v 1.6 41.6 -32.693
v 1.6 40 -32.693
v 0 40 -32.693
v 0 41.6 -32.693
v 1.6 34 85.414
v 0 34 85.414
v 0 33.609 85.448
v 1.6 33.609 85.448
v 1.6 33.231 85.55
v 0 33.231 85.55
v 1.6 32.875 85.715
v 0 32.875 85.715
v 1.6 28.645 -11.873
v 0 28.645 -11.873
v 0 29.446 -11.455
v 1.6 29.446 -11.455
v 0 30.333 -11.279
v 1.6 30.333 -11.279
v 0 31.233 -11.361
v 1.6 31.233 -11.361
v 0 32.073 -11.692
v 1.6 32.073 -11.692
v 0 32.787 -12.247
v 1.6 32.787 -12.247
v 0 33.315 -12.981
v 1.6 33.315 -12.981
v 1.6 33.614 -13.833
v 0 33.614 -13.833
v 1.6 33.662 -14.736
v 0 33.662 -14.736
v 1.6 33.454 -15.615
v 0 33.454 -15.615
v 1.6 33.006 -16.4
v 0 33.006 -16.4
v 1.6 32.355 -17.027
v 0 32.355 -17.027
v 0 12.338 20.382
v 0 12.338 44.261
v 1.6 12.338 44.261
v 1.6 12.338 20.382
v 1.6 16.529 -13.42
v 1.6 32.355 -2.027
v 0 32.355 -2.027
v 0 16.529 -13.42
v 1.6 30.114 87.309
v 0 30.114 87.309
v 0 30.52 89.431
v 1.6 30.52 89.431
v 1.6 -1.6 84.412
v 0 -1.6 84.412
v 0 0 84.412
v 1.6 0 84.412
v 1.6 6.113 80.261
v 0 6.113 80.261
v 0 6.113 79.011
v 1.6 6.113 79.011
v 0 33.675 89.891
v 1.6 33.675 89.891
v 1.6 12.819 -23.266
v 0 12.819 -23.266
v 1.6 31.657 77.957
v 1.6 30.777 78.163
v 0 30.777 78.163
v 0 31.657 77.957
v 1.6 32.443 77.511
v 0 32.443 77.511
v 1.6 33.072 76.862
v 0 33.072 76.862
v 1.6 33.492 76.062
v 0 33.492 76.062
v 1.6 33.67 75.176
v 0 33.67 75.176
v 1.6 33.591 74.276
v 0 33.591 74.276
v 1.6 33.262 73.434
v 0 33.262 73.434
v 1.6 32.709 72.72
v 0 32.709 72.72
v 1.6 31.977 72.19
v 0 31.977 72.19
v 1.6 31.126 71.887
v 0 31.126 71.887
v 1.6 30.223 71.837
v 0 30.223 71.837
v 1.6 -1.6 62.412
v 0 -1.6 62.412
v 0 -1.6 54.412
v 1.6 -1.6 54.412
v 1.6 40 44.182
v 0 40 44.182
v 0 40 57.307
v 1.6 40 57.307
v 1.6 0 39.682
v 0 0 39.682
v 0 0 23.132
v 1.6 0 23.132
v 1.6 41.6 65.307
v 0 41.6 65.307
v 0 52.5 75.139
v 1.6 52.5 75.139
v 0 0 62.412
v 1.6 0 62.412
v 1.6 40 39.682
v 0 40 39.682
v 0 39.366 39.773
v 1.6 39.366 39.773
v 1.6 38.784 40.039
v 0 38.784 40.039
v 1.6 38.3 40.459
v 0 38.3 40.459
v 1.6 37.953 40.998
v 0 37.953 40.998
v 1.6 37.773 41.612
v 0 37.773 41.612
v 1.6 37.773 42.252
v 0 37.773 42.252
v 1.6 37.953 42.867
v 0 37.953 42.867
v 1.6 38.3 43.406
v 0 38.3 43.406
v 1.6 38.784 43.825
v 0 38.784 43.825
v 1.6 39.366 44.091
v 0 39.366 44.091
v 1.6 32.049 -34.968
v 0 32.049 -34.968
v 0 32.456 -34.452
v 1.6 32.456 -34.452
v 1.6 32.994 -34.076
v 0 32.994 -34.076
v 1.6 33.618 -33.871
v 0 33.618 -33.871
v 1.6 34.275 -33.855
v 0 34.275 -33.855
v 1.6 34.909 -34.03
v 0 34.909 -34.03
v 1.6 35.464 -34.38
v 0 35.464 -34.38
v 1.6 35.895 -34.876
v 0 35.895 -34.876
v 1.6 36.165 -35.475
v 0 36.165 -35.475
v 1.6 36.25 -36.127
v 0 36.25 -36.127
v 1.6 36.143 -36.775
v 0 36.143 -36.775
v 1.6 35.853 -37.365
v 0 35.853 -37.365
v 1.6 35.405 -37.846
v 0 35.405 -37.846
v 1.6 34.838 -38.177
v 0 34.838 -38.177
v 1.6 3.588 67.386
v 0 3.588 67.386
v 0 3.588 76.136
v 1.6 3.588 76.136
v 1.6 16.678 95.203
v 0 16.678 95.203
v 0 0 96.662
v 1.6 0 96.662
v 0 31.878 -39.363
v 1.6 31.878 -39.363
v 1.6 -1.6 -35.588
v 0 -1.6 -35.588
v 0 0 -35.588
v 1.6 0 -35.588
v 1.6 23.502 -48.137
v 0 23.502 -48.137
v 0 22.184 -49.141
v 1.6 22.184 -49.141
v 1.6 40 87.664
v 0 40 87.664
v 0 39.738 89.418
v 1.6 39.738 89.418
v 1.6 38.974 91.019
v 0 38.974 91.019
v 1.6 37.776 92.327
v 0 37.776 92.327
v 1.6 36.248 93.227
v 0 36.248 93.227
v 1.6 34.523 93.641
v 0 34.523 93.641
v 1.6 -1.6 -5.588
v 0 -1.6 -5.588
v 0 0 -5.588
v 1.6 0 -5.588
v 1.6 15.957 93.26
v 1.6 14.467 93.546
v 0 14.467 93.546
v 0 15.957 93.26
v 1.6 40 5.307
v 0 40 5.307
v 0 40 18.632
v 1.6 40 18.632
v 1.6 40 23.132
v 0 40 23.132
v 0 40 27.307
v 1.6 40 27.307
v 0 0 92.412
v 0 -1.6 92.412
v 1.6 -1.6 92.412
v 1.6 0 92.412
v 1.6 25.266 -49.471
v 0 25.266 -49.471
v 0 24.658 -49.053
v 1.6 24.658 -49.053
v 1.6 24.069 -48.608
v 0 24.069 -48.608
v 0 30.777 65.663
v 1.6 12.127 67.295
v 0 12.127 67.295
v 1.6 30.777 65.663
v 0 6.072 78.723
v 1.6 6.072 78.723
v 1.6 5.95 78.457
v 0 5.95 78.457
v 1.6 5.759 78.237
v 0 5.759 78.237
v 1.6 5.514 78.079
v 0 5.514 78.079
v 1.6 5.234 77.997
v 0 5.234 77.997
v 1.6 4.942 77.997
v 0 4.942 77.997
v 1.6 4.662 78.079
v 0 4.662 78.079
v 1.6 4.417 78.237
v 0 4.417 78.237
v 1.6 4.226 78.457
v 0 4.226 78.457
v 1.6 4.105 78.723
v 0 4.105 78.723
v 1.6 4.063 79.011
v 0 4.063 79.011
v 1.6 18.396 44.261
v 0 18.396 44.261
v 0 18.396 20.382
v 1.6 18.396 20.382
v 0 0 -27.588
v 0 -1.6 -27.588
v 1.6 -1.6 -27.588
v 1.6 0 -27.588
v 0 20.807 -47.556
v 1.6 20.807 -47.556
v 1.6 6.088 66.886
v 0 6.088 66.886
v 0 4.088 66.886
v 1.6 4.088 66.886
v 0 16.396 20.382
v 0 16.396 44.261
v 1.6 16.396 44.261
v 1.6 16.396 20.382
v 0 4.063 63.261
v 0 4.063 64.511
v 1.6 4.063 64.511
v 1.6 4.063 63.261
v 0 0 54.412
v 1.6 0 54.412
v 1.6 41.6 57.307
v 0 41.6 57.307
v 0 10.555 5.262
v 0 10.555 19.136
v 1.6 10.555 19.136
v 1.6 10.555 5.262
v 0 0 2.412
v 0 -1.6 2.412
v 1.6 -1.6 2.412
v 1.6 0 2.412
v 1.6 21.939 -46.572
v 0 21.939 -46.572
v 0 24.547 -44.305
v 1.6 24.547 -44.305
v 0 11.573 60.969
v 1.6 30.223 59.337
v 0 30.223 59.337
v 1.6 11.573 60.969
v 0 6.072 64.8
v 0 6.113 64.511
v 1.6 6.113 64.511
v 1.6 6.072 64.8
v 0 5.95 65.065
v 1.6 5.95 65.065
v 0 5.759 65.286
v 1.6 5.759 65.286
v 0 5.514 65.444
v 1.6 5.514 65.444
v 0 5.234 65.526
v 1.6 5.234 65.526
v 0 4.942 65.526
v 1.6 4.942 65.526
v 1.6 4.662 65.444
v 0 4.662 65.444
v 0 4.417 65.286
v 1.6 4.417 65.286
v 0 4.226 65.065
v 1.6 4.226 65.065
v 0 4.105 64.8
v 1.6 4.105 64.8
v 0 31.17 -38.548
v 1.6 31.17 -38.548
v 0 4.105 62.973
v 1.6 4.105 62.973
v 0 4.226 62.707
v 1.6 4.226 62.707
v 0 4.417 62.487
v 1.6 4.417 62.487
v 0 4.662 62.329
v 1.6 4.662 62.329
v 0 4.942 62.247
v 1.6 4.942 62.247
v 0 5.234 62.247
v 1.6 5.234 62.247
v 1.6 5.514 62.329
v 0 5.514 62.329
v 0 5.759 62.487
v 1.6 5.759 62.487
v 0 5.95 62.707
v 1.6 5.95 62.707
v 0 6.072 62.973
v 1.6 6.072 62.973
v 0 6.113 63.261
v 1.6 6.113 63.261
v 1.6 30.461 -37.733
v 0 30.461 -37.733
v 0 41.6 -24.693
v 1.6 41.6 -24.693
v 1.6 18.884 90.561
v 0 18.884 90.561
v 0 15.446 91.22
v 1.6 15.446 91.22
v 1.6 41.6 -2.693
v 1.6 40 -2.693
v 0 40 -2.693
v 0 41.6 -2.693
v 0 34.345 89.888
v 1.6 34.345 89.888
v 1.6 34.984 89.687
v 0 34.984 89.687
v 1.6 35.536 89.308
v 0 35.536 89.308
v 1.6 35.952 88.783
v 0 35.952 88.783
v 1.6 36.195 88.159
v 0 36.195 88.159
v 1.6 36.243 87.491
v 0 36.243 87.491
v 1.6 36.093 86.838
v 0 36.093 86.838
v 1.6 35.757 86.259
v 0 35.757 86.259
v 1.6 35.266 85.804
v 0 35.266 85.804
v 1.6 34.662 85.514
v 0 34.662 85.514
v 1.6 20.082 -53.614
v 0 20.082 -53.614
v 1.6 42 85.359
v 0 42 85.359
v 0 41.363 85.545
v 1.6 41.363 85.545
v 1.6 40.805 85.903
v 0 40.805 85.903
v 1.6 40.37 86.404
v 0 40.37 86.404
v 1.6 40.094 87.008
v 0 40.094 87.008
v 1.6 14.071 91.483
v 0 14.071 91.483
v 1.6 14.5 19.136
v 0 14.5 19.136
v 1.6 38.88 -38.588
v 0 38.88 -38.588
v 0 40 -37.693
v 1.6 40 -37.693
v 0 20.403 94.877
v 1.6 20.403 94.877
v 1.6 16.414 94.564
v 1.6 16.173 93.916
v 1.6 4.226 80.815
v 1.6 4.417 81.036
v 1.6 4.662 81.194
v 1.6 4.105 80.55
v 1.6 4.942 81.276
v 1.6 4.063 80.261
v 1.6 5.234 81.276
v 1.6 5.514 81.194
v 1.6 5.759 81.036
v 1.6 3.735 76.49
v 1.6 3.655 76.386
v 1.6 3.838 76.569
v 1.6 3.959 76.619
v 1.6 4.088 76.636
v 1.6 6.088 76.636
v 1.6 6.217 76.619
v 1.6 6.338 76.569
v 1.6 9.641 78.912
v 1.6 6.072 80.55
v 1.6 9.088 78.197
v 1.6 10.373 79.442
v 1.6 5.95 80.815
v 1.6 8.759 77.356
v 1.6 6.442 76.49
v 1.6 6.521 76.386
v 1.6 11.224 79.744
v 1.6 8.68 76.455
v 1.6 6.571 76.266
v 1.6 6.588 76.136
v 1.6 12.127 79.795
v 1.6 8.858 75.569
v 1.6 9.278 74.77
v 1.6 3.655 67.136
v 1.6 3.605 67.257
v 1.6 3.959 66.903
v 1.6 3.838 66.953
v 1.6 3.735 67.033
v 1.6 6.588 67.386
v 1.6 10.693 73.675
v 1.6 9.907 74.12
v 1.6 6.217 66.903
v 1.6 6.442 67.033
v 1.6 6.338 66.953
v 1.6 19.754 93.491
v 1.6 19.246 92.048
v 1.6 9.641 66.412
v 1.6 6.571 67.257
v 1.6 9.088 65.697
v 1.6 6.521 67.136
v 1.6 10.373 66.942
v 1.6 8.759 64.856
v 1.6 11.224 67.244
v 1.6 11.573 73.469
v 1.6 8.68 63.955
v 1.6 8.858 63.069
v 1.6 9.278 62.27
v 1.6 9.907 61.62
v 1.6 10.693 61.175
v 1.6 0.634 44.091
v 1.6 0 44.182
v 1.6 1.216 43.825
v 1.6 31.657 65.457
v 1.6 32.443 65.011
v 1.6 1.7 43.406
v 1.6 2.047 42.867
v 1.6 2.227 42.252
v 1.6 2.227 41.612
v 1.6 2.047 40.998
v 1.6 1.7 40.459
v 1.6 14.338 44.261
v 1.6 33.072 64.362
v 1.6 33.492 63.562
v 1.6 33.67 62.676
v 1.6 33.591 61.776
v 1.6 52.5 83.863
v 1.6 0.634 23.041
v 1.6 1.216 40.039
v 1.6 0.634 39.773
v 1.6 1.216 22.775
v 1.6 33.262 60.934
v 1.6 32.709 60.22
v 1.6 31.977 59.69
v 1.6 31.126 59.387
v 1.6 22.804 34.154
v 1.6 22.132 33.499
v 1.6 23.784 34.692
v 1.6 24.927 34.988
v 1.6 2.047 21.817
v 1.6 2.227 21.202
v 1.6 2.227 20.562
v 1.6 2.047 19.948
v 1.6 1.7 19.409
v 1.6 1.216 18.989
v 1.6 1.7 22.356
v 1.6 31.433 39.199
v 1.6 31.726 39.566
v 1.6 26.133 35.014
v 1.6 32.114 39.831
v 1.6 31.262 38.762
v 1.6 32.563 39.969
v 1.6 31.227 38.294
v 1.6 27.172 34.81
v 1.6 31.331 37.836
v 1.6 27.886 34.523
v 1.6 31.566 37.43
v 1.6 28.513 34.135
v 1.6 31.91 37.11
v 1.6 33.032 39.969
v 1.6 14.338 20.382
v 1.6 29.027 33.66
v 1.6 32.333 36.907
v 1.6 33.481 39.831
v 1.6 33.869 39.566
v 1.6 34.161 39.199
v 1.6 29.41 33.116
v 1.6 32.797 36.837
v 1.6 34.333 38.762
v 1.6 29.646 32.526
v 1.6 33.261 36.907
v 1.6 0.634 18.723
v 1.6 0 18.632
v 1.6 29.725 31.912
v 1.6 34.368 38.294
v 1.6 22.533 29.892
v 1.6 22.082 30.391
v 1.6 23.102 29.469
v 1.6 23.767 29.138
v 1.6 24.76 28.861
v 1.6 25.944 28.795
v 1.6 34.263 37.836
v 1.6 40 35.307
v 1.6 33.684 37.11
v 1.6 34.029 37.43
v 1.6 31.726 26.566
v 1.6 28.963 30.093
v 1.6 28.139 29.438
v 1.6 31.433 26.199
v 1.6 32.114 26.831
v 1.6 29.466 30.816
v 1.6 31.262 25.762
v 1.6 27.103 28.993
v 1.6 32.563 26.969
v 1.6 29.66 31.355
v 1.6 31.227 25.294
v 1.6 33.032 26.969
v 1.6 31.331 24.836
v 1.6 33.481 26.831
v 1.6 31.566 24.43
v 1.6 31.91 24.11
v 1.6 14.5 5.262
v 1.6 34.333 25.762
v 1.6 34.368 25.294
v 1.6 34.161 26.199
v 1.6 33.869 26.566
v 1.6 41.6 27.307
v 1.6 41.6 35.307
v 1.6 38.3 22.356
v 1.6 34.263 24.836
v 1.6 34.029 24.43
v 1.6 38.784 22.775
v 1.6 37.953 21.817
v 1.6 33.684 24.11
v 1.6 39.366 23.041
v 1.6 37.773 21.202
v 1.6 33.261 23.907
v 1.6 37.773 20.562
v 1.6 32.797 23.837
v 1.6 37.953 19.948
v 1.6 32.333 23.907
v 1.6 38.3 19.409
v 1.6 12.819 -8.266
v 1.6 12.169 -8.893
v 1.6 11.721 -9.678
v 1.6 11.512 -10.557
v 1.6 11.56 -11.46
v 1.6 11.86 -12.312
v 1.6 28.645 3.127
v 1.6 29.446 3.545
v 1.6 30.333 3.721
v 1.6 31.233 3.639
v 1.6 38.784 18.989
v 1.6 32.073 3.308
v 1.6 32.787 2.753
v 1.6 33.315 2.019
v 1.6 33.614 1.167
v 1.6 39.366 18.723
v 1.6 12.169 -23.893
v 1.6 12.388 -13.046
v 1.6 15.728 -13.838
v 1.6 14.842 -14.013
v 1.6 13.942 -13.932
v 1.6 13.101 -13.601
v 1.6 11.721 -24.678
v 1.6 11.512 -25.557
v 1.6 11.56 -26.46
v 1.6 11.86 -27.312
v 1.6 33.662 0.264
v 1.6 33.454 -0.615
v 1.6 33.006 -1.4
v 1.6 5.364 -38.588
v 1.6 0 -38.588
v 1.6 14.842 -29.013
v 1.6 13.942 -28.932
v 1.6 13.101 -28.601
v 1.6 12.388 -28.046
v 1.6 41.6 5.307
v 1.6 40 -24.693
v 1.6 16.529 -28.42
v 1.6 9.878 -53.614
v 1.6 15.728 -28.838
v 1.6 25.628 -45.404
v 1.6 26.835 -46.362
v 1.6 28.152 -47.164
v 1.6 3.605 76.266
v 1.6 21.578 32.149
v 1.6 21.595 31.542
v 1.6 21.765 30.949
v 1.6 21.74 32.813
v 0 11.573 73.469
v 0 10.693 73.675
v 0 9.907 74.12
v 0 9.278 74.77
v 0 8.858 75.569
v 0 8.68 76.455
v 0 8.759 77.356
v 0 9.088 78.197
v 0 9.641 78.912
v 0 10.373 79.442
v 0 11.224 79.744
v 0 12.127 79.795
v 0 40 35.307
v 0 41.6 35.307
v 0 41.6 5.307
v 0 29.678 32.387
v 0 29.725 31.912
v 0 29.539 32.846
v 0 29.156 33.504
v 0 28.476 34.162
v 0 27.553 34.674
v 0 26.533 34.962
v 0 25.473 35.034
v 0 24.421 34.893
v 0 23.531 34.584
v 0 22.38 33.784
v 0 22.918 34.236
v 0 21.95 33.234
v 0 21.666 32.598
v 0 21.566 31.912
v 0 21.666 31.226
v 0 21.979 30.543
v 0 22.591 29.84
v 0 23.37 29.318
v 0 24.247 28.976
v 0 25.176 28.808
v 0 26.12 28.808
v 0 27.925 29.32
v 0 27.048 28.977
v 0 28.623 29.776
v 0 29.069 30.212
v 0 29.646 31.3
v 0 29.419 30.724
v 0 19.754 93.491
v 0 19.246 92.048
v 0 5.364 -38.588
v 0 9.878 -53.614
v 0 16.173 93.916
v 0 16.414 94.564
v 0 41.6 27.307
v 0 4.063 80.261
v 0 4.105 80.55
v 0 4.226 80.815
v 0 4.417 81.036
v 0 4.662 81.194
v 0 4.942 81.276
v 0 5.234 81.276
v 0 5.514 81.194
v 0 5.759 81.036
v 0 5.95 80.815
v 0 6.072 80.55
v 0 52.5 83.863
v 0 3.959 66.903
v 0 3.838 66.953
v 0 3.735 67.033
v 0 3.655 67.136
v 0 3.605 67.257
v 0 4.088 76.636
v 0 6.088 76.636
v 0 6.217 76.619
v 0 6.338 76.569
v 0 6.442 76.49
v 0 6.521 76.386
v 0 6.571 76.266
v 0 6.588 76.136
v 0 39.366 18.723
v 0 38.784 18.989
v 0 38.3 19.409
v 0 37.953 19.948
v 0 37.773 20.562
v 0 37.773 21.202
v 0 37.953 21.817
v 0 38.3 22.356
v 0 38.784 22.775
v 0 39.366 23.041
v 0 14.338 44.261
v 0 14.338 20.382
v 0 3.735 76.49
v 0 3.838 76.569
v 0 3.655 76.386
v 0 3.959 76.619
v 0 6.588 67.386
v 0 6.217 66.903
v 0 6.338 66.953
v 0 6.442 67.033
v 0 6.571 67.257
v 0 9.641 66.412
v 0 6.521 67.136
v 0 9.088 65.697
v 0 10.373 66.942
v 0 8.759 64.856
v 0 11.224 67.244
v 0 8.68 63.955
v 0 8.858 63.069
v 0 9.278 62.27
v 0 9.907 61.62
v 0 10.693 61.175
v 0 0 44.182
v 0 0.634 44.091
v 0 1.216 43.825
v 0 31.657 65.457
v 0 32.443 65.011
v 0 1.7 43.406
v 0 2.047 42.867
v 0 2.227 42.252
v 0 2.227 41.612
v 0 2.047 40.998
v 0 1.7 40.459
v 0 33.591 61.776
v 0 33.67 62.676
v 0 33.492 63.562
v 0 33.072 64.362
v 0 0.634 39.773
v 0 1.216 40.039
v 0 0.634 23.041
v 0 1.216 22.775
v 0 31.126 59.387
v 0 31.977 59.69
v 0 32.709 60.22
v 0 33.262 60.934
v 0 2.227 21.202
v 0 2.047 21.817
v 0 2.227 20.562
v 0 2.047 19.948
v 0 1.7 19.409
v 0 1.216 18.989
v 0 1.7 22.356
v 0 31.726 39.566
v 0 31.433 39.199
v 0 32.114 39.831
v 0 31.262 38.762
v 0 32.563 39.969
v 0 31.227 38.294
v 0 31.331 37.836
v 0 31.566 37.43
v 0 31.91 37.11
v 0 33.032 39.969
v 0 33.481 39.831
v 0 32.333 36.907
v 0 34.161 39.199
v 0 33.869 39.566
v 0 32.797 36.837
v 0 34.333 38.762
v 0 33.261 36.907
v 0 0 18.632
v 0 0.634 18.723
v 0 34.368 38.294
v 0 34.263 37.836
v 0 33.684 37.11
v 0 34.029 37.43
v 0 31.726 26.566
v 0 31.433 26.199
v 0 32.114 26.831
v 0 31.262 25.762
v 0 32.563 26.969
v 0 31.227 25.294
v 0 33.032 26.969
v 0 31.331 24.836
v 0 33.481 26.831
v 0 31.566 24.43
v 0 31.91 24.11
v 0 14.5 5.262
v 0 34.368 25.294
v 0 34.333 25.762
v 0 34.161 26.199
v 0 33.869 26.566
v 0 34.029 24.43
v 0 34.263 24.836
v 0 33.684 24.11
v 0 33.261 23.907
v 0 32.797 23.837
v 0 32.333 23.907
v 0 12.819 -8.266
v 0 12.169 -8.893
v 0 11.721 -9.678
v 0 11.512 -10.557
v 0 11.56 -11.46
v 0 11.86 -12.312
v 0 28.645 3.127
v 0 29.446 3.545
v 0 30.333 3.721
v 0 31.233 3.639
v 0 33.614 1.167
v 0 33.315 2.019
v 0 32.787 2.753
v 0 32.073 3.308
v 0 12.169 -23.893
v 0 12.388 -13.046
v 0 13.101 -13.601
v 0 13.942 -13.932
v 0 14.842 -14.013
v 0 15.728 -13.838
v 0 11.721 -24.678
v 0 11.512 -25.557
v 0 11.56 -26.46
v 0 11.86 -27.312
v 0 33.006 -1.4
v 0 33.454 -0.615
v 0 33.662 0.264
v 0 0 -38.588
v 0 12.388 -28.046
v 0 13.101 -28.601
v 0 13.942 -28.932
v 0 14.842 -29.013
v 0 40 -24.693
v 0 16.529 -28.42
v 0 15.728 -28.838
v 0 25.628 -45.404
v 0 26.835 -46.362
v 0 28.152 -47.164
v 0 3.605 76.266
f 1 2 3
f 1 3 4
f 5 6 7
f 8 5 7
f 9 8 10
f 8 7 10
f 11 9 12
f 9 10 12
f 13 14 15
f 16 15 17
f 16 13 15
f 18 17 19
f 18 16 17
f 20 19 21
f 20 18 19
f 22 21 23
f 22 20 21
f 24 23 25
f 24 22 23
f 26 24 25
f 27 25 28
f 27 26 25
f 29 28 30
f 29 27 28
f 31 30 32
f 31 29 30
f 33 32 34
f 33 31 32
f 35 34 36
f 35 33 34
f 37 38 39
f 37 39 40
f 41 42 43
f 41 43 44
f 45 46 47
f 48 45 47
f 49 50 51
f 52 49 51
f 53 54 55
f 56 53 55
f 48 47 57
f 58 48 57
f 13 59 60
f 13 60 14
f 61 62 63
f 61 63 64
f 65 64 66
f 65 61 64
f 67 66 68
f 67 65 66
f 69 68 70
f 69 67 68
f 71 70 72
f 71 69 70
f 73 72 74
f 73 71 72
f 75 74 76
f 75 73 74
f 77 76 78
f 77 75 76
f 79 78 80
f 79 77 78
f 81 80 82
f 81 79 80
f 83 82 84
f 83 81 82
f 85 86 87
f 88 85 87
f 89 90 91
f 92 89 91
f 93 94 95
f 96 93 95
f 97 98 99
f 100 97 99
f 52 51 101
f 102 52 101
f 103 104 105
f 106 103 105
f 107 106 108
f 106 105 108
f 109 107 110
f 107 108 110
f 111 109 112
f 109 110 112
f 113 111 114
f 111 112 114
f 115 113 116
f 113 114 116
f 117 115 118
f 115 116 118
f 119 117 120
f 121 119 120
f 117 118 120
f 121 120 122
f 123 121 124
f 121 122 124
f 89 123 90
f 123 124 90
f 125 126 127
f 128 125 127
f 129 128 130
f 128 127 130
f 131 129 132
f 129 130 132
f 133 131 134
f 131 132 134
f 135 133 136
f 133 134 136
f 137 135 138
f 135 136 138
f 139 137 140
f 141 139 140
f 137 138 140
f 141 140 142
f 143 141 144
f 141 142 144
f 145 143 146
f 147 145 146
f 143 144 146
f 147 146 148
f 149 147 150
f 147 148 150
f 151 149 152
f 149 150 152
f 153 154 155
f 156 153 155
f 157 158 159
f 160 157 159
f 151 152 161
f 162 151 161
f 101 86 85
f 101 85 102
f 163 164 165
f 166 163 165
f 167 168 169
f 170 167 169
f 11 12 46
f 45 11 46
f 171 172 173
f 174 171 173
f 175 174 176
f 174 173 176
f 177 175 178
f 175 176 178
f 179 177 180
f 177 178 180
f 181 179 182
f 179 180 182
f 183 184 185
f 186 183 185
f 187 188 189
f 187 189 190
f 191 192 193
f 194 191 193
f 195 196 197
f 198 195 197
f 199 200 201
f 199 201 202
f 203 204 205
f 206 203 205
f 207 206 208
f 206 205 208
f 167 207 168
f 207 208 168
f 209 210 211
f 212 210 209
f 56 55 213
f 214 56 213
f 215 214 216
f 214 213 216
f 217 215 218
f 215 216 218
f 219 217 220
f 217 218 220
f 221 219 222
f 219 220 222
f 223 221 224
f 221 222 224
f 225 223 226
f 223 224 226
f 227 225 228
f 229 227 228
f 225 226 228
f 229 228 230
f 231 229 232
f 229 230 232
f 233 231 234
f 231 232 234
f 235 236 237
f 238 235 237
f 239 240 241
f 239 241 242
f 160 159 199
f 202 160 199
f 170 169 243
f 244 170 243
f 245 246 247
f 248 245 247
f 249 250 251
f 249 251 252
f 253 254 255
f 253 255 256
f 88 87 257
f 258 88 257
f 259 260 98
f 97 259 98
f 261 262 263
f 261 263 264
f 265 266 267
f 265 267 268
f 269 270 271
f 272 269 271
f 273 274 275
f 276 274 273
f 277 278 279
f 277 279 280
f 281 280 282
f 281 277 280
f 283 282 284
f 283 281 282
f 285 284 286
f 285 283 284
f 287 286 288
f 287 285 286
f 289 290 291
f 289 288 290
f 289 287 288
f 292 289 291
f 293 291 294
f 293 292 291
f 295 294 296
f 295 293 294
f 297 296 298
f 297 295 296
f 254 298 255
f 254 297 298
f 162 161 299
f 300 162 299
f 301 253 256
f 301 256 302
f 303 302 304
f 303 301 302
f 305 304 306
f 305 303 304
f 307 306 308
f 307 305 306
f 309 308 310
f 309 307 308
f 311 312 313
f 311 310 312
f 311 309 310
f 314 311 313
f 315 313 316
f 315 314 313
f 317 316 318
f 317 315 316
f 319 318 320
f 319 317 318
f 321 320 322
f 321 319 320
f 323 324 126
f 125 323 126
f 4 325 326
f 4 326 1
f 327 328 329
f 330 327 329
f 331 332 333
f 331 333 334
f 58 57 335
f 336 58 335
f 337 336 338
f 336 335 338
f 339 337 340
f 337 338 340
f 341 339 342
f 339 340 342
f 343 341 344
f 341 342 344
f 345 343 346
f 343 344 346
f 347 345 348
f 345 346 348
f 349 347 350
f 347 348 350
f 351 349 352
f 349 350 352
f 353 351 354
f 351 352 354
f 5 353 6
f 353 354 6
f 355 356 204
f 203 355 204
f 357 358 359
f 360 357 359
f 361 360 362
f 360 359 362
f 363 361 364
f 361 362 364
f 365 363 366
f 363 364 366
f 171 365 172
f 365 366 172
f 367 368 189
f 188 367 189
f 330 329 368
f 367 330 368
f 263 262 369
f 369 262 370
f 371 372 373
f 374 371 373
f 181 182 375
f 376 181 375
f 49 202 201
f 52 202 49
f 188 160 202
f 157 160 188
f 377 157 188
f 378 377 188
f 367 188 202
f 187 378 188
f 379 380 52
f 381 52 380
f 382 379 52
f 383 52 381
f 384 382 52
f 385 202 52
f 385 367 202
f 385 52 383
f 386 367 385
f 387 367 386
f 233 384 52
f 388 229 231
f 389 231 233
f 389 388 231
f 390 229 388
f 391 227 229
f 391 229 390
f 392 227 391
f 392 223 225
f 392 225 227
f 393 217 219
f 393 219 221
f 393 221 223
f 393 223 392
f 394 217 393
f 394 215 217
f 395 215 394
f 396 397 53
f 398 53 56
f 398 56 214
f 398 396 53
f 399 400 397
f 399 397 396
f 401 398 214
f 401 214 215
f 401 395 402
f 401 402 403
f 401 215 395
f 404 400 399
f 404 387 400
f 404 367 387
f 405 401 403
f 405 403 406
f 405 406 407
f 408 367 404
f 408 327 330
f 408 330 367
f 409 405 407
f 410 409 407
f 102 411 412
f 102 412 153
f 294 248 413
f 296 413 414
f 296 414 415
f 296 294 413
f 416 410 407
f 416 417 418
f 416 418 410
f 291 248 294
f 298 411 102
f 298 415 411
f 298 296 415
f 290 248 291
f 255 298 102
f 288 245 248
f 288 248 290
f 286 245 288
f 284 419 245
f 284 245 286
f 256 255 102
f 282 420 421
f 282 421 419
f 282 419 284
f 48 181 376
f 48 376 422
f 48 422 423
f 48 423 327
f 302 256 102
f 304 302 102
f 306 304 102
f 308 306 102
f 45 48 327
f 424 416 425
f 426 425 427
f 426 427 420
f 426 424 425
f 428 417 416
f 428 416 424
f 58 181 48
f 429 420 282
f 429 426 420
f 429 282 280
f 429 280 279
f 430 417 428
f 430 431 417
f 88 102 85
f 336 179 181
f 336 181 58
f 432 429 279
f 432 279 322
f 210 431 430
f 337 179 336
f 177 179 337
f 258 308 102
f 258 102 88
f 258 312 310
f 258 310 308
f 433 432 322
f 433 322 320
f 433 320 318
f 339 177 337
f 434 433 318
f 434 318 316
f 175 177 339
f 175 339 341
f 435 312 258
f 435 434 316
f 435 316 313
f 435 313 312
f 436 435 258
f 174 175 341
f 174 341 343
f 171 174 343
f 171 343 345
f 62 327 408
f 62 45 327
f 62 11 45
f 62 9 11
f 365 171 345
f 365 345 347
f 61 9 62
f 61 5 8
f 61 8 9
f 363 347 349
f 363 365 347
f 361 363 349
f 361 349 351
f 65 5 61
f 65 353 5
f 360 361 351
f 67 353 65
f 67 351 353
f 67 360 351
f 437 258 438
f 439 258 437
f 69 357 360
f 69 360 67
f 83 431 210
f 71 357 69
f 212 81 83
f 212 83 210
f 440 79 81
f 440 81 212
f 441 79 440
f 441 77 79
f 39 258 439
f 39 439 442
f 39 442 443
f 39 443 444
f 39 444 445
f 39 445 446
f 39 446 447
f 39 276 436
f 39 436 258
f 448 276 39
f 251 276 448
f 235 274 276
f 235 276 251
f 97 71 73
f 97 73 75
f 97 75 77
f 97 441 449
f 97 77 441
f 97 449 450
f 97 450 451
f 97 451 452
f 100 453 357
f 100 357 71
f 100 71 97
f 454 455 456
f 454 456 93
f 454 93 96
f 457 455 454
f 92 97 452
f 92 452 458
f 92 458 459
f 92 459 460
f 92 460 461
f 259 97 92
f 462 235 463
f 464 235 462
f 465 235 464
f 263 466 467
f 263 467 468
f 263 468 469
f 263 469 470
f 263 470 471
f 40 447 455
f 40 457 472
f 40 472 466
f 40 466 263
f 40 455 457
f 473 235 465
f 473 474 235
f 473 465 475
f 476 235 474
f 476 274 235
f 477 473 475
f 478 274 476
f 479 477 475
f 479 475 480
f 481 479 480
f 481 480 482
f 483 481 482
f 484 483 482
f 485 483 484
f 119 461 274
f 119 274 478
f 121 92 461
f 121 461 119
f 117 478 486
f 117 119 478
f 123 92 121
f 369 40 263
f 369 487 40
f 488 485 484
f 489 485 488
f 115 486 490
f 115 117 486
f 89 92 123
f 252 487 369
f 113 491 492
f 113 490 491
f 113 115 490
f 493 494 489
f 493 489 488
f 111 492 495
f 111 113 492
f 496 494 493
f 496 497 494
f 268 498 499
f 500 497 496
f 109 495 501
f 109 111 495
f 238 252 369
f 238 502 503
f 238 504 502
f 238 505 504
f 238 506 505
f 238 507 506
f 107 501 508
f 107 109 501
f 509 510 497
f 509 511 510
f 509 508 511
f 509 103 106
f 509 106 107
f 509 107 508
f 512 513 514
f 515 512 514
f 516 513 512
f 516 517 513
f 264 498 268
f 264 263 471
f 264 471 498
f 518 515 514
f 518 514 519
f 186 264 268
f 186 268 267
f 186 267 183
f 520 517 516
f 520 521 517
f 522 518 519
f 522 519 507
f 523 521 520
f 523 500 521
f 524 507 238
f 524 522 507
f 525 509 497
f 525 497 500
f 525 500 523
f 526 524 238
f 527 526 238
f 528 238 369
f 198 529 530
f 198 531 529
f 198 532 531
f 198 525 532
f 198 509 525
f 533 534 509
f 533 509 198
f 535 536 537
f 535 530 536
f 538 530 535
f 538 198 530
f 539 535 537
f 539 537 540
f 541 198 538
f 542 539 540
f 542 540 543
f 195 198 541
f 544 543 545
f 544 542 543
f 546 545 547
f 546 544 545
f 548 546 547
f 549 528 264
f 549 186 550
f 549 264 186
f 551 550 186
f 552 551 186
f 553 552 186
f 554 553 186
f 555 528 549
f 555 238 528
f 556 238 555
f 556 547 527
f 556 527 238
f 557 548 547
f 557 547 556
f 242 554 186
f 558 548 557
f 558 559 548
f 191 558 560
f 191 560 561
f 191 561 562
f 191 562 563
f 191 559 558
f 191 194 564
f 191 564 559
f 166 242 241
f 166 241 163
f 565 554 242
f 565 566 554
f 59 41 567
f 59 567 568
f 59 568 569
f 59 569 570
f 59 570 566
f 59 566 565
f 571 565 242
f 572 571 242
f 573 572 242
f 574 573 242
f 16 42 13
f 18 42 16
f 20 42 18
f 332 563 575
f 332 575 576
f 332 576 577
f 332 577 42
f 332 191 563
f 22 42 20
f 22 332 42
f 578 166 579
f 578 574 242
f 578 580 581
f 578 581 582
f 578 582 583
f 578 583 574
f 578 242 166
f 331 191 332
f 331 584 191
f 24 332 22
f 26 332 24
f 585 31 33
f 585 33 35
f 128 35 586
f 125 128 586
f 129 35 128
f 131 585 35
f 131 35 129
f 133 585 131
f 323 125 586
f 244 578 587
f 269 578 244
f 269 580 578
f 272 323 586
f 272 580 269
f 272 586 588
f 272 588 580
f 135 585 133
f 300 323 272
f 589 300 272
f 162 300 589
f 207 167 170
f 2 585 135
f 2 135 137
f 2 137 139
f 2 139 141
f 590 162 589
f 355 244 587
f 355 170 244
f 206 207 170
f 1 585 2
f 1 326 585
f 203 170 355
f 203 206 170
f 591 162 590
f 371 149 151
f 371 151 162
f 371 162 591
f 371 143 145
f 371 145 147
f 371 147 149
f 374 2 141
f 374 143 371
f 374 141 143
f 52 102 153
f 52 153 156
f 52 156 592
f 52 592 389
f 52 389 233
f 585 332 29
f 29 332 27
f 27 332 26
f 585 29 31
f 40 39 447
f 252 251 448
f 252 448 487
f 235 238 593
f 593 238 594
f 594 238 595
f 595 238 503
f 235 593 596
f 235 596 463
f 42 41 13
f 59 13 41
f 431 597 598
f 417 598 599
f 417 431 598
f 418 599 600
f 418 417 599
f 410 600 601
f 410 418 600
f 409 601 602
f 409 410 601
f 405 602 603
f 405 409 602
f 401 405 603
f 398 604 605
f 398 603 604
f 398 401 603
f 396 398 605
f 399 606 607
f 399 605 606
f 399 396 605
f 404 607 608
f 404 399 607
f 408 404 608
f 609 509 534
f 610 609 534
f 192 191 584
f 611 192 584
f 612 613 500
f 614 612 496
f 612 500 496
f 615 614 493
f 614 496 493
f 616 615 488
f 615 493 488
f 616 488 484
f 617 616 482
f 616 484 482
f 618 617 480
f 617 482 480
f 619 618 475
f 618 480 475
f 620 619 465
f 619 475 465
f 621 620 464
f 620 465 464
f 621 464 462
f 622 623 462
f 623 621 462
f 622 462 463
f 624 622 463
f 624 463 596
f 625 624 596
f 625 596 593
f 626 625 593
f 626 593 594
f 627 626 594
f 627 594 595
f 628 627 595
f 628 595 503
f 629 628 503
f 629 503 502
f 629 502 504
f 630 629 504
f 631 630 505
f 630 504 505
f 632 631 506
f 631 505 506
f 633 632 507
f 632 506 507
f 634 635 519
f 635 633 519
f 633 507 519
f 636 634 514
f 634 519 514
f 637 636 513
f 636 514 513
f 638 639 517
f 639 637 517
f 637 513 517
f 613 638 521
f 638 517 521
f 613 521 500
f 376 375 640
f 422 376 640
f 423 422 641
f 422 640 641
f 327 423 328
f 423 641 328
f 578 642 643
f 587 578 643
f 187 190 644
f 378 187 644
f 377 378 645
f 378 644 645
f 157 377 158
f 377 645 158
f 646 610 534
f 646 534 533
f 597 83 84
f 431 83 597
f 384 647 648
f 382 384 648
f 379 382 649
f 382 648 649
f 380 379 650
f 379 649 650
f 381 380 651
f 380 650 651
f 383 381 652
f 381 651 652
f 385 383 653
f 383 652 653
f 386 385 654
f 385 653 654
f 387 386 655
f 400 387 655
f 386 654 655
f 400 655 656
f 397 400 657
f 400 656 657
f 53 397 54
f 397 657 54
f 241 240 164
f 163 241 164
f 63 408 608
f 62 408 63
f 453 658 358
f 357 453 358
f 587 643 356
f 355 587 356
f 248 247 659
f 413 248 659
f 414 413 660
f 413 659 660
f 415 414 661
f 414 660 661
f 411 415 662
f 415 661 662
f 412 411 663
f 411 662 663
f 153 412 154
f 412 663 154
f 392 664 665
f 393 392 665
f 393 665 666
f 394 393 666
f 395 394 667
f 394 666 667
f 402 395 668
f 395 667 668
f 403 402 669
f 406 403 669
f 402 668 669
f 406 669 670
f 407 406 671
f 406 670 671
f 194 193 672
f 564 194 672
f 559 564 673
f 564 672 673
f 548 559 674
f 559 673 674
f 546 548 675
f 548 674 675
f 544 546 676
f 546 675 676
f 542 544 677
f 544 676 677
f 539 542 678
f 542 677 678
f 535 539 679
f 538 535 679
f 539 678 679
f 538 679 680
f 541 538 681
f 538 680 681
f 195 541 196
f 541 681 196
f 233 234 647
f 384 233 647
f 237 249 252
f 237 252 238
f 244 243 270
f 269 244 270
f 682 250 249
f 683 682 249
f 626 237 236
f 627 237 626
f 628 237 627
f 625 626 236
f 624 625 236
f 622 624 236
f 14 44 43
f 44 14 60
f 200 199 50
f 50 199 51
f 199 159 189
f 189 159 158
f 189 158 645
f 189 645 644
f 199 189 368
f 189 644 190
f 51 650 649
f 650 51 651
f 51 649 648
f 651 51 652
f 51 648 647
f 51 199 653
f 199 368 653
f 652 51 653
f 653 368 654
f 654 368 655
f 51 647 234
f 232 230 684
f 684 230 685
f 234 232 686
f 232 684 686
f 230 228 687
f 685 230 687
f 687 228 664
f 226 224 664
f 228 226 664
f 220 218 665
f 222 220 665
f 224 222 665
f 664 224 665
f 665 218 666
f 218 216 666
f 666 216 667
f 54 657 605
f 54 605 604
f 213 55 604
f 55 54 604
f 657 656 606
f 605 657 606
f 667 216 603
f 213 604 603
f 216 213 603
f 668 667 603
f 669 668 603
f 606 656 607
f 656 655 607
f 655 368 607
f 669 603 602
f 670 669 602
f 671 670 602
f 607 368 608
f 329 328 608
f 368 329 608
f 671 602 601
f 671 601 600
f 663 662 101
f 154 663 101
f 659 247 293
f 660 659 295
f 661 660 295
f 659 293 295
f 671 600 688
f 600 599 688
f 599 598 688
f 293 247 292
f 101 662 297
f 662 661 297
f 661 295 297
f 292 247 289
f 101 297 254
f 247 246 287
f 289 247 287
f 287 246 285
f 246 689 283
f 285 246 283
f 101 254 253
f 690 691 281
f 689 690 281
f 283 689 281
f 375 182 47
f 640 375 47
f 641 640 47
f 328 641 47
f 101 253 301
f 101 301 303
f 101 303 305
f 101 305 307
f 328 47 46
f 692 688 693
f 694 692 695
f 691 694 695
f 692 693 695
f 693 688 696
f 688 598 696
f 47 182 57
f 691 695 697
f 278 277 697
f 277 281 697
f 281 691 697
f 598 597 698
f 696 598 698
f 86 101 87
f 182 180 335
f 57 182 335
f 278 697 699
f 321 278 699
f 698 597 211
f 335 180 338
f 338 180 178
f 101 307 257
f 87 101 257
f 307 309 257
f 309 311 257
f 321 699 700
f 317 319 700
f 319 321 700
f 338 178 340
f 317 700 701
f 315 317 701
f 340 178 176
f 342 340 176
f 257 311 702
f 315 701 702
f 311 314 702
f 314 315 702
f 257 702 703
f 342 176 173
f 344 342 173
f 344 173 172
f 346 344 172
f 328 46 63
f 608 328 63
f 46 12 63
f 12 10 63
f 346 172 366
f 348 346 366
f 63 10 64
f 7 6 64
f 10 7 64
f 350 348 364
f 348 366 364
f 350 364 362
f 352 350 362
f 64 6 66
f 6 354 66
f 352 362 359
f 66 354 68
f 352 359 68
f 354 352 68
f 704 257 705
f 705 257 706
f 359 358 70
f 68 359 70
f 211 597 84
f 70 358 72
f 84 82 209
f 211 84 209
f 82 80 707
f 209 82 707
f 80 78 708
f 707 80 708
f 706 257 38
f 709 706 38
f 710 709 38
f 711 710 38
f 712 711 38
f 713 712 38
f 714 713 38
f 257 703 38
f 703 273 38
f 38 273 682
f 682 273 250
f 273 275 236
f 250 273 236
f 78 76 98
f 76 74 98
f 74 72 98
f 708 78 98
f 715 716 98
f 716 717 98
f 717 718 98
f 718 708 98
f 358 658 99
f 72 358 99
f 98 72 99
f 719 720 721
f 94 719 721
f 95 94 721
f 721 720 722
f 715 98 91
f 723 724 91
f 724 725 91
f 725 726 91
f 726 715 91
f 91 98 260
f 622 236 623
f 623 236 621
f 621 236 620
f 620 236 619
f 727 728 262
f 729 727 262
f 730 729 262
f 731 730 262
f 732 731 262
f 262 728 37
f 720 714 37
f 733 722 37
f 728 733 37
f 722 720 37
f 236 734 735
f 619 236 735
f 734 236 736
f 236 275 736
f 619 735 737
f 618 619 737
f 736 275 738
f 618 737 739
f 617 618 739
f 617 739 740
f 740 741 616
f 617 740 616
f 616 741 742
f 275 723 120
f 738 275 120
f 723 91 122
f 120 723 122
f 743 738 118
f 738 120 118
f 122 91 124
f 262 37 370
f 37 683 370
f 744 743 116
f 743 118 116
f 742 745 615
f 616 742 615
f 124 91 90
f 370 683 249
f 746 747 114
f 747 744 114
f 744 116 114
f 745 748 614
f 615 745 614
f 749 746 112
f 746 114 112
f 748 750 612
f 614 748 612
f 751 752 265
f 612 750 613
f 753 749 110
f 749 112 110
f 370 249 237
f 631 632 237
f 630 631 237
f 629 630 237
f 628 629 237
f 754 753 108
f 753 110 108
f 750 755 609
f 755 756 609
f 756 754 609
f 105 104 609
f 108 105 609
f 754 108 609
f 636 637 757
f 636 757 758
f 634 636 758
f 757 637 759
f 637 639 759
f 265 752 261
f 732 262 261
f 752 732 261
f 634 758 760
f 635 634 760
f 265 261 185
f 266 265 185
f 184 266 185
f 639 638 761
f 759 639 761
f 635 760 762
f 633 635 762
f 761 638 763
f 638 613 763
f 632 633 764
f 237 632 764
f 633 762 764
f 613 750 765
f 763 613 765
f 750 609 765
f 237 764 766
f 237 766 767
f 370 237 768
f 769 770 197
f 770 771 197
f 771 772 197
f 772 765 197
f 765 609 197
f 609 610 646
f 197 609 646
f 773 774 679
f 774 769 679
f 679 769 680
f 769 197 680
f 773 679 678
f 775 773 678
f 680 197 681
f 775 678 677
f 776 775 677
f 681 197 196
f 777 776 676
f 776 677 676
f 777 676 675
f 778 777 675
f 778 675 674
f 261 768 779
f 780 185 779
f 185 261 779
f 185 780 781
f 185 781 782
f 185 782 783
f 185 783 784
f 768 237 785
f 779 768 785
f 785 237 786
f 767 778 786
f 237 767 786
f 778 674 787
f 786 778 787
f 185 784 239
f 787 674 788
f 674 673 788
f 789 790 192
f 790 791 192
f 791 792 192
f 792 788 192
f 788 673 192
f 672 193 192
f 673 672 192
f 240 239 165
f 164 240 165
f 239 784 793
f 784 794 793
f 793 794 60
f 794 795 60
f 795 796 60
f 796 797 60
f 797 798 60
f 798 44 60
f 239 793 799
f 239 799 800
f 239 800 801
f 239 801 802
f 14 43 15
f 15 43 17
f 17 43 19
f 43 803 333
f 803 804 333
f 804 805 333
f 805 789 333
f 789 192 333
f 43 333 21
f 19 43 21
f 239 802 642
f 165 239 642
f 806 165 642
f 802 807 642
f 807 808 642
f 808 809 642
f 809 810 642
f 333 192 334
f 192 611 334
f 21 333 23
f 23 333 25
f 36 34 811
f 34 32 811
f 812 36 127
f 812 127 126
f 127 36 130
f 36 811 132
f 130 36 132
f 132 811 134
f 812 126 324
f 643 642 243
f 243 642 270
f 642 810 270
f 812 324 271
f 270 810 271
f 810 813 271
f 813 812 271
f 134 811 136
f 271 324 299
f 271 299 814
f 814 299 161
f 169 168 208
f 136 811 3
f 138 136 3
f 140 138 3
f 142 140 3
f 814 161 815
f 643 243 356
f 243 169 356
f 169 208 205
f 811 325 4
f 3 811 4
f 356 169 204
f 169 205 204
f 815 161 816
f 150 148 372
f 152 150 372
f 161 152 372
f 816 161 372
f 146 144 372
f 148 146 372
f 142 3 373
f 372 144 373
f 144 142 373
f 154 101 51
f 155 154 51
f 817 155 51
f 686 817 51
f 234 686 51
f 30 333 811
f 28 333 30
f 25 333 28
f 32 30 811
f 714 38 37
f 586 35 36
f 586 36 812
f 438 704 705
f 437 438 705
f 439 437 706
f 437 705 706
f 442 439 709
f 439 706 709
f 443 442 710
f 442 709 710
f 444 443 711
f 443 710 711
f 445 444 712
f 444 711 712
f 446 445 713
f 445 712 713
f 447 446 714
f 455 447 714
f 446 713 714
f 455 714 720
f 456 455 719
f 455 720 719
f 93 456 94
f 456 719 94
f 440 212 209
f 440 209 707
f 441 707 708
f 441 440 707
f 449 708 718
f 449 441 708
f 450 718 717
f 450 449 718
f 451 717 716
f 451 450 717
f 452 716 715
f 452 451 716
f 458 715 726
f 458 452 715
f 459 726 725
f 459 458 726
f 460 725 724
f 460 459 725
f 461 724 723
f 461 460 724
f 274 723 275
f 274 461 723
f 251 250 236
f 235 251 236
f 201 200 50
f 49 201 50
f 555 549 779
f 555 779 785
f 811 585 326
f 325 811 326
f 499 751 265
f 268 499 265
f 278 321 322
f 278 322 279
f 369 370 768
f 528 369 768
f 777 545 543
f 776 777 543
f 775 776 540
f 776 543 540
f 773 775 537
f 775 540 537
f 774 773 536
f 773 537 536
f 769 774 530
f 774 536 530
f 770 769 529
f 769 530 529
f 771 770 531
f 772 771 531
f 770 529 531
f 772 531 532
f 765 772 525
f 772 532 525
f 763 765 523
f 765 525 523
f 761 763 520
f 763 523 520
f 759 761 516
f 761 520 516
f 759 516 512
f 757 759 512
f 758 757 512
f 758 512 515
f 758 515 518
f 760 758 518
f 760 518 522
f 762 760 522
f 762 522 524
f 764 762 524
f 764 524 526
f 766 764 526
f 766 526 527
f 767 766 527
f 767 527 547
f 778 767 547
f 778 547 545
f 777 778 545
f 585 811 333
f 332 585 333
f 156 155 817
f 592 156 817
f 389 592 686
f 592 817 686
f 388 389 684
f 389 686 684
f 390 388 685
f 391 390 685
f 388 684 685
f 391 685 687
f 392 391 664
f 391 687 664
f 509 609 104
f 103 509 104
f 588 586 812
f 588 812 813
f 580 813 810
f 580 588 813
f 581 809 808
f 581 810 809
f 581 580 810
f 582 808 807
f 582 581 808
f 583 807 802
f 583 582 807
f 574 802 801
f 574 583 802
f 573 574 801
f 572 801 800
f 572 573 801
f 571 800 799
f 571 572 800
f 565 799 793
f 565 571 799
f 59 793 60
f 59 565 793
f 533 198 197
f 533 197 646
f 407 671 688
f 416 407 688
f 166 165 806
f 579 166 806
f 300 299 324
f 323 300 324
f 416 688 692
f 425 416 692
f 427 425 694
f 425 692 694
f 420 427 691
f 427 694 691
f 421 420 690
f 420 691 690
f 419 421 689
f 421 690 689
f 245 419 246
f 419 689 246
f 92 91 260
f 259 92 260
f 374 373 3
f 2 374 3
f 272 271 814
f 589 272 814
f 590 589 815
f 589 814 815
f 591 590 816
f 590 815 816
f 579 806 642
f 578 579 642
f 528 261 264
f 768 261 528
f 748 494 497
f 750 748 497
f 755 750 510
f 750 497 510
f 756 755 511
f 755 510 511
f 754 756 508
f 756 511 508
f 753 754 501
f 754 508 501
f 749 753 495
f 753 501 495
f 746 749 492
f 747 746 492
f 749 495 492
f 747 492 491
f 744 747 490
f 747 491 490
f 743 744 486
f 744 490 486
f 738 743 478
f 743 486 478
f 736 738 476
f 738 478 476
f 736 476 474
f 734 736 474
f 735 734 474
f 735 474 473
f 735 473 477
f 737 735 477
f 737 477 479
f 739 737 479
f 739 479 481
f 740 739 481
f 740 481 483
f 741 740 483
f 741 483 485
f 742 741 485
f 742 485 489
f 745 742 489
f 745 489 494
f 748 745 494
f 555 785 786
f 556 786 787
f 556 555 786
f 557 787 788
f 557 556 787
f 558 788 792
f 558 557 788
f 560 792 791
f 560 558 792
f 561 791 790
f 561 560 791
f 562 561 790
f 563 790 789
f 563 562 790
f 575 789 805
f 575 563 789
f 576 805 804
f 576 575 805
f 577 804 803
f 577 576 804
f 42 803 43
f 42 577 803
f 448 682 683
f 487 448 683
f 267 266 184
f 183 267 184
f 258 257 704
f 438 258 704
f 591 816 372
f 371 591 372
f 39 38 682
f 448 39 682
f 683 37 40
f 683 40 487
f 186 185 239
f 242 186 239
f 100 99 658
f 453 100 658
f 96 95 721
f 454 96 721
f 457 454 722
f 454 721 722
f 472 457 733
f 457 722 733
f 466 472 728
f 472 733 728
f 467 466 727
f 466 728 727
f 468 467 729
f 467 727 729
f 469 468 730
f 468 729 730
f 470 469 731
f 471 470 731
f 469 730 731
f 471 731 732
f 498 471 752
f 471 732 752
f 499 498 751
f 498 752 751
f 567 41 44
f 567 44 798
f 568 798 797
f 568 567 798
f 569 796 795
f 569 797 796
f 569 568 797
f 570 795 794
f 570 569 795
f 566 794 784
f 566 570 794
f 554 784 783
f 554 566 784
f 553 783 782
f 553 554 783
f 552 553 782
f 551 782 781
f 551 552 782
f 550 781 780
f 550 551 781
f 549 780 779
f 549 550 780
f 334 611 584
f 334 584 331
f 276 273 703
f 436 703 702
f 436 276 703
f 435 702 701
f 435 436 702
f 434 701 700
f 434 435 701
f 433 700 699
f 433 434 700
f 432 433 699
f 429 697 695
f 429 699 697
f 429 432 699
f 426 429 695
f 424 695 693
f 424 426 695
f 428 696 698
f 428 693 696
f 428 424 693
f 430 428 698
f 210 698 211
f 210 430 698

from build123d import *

# Parameters (mm, degrees)
SKETCH_215_W           = 23.879073069
SKETCH_215_H           = 2
SKETCH_215_W_2         = 13.873866224
SKETCH_215_H_2         = 3.944574251
EXTRUDE_1_DEPTH        = 1.6
SKETCH_2_W             = 8
SKETCH_2_H             = 1.6
EXTRUDE_3744_DEPTH     = 1.6
SKETCH_3858_R          = 1.575
SKETCH_3858_RX         = 4.079397779
SKETCH_3858_RY         = 3.125
CUT_EXTRUDE_4259_DEPTH = 111.010448945
CUT_EXTRUDE_4725_DEPTH = 111.010449082
USB_C_DEPTH            = 111.010449082


with BuildPart() as part:
    # Sketch 215 → 凸台-拉伸1 (new body)
    with BuildSketch(Plane(origin=(0, 0, 0), x_dir=(0, 0, -1), z_dir=(1, 0, 0))):
        with BuildLine():
            Line((-95.202576637, 16.678130112), (-96.66172395, 0))
            Line((-96.66172395, 0), (-44.182229478, 0))
            ThreePointArc((-44.182229478, 0), (-41.932229478, 2.25), (-39.682229478, 0))
            Line((-39.682229478, 0), (-23.132229478, 0))
            ThreePointArc((-23.132229478, 0), (-20.882229478, 2.25), (-18.632229478, 0))
            Line((-18.632229478, 0), (38.58827605, 0))
            Line((38.58827605, 0), (38.58827605, 5.363667343))
            Line((38.58827605, 5.363667343), (53.613979238, 9.877821069))
            Line((53.613979238, 9.877821069), (53.613979238, 20.082386187))
            Line((53.613979238, 20.082386187), (49.47062371, 25.265958003))
            ThreePointArc((49.47062371, 25.265958003), (48.834122057, 24.360802519), (48.136507156, 23.501864655))
            Line((48.136507156, 23.501864655), (49.140587437, 22.184380908))
            Line((49.140587437, 22.184380908), (47.555615421, 20.806751165))
            Line((47.555615421, 20.806751165), (46.571594176, 21.938874033))
            Line((46.571594176, 21.938874033), (44.304779315, 24.546859335))
            ThreePointArc((44.304779315, 24.546859335), (45.901319607, 26.216879129), (47.163951689, 28.151735001))
            Line((47.163951689, 28.151735001), (38.58827605, 38.88038965))
            Line((38.58827605, 38.88038965), (37.693344157, 40))
            Line((37.693344157, 40), (-18.632229478, 40))
            ThreePointArc((-18.632229478, 40), (-20.882229478, 37.75), (-23.132229478, 40))
            Line((-23.132229478, 40), (-39.682229478, 40))
            ThreePointArc((-39.682229478, 40), (-41.932229478, 37.75), (-44.182229478, 40))
            Line((-44.182229478, 40), (-87.664190365, 40))
            ThreePointArc((-87.664190365, 40), (-91.717731611, 38.423664021), (-93.641358554, 34.522934456))
            Line((-93.641358554, 34.522934456), (-94.87665585, 20.403421746))
            ThreePointArc((-94.87665585, 20.403421746), (-92.775563539, 19.482408503), (-90.560913042, 18.883929203))
            Line((-90.560913042, 18.883929203), (-91.219638908, 15.446476624))
            Line((-91.219638908, 15.446476624), (-91.483129255, 14.071495593))
            Line((-91.483129255, 14.071495593), (-93.545600802, 14.466731113))
            Line((-93.545600802, 14.466731113), (-93.260074318, 15.956704104))
            ThreePointArc((-93.260074318, 15.956704104), (-94.241224457, 16.290763242), (-95.202576637, 16.678130112))
        make_face()
        with Locations((-32.321766012, 13.338077)):
            Rectangle(SKETCH_215_W, SKETCH_215_H, mode=Mode.SUBTRACT)
        with Locations((-32.321766012, 17.395875517)):
            Rectangle(SKETCH_215_W, SKETCH_215_H, mode=Mode.SUBTRACT)
        with Locations((-12.198657062, 12.527713279)):
            Rectangle(SKETCH_215_W_2, SKETCH_215_H_2, mode=Mode.SUBTRACT)
        with BuildLine():
            Line((-87.309268426, 30.113751112), (-88.369968079, 30.317015094))
            Line((-88.369968079, 30.317015094), (-89.430667732, 30.520279076))
            Line((-89.430667732, 30.520279076), (-89.890653352, 33.675403991))
            ThreePointArc((-89.890653352, 33.675403991), (-87.826914488, 36.244108032), (-85.414190365, 34))
            ThreePointArc((-85.414190365, 34), (-85.490811978, 33.417826153), (-85.715458265, 32.875303062))
            Line((-85.715458265, 32.875303062), (-87.309268426, 30.113751112))
        make_face(mode=Mode.SUBTRACT)
        with BuildLine():
            ThreePointArc((34.968023431, 32.04870964), (34.612244182, 35.698184303), (38.176585209, 34.837534989))
            Line((38.176585209, 34.837534989), (39.363457628, 31.878188125))
            Line((39.363457628, 31.878188125), (38.548329162, 31.169692829))
            Line((38.548329162, 31.169692829), (37.733200697, 30.461197532))
            Line((37.733200697, 30.461197532), (34.968023431, 32.04870964))
        make_face(mode=Mode.SUBTRACT)
    extrude(amount=EXTRUDE_1_DEPTH)

    # 草图2 → Extrude 3744 (add)
    with BuildSketch(Plane(origin=(0, 0, 0), x_dir=(0, 0, -1), z_dir=(1, 0, 0))):
        with Locations((31.58827605, -0.8)):
            Rectangle(SKETCH_2_W, SKETCH_2_H)
        with BuildLine():
            Line((-83.862737476, 52.5), (-85.358986401, 42))
            ThreePointArc((-85.358986401, 42), (-86.138250874, 40.569690448), (-87.664190365, 40))
            Line((-87.664190365, 40), (-65.306655843, 40))
            Line((-65.306655843, 40), (-57.306655843, 40))
            Line((-57.306655843, 40), (-57.306655843, 41.6))
            Line((-57.306655843, 41.6), (-65.306655843, 41.6))
            Line((-65.306655843, 41.6), (-75.139107316, 52.5))
            Line((-75.139107316, 52.5), (-83.862737476, 52.5))
        make_face()
        with Locations((1.58827605, -0.8)):
            Rectangle(SKETCH_2_W, SKETCH_2_H)
        with Locations((-58.41172395, -0.8)):
            Rectangle(SKETCH_2_W, SKETCH_2_H)
        with Locations((-88.41172395, -0.8)):
            Rectangle(SKETCH_2_W, SKETCH_2_H)
        with Locations((28.693344157, 40.8)):
            Rectangle(SKETCH_2_W, SKETCH_2_H)
        with Locations((-1.306655843, 40.8)):
            Rectangle(SKETCH_2_W, SKETCH_2_H)
        with Locations((-31.306655843, 40.8)):
            Rectangle(SKETCH_2_W, SKETCH_2_H)
    extrude(amount=EXTRUDE_3744_DEPTH)

    # Sketch 3858 → Cut-Extrude 4259 (cut, through all)
    with BuildSketch(Plane(origin=(1.6, 0, 0), x_dir=(0, 0, -1), z_dir=(1, 0, 0))):
        with Locations((-38.41172395, 32.797244765)):
            Circle(SKETCH_3858_R)
        with Locations((-25.41172395, 32.797244765)):
            Circle(SKETCH_3858_R)
        with Locations(Location((-31.91172395, 25.645875517), (0, 0, 90))):
            Ellipse(SKETCH_3858_RX, SKETCH_3858_RY)
    extrude(amount=-CUT_EXTRUDE_4259_DEPTH, mode=Mode.SUBTRACT)

    # 草图3 → Cut-Extrude 4725 (cut, through all)
    with BuildSketch(Plane(origin=(1.6, 0, 0), x_dir=(0, 0, -1), z_dir=(1, 0, 0))):
        with BuildLine():
            Line((-71.837081834, 30.223280517), (-73.468745408, 11.573280517))
            ThreePointArc((-73.468745408, 11.573280517), (-76.908383058, 8.687081834), (-79.794581741, 12.126719483))
            Line((-79.794581741, 12.126719483), (-78.162918166, 30.776719483))
            ThreePointArc((-78.162918166, 30.776719483), (-74.723280517, 33.662918166), (-71.837081834, 30.223280517))
        make_face()
        with BuildLine():
            Line((17.026747393, 32.354992688), (28.419615873, 16.52930004))
            ThreePointArc((28.419615873, 16.52930004), (27.697861168, 12.097559959), (23.266121087, 12.819314663))
            Line((23.266121087, 12.819314663), (11.873252607, 28.645007312))
            ThreePointArc((11.873252607, 28.645007312), (12.595007312, 33.076747393), (17.026747393, 32.354992688))
        make_face()
        with BuildLine():
            Line((2.026747393, 32.354992688), (13.419615873, 16.52930004))
            ThreePointArc((13.419615873, 16.52930004), (12.697861168, 12.097559959), (8.266121087, 12.819314663))
            Line((8.266121087, 12.819314663), (-3.126747393, 28.645007312))
            ThreePointArc((-3.126747393, 28.645007312), (-2.404992688, 33.076747393), (2.026747393, 32.354992688))
        make_face()
        with BuildLine():
            Line((-59.337081834, 30.223280517), (-60.968745408, 11.573280517))
            ThreePointArc((-60.968745408, 11.573280517), (-64.408383058, 8.687081834), (-67.294581741, 12.126719483))
            Line((-67.294581741, 12.126719483), (-65.662918166, 30.776719483))
            ThreePointArc((-65.662918166, 30.776719483), (-62.223280517, 33.662918166), (-59.337081834, 30.223280517))
        make_face()
    extrude(amount=-CUT_EXTRUDE_4725_DEPTH, mode=Mode.SUBTRACT)

    # Sketch1 → USB-C供电接口 (cut, through all)
    with BuildSketch(Plane(origin=(0, 0, 0), x_dir=(0, 0, -1), z_dir=(1, 0, 0))):
        with BuildLine():
            Line((-76.136302547, 6.588077), (-67.386302547, 6.588077))
            ThreePointArc((-67.386302547, 6.588077), (-67.032749156, 6.441630391), (-66.886302547, 6.088077))
            Line((-66.886302547, 6.088077), (-66.886302547, 4.088077))
            ThreePointArc((-66.886302547, 4.088077), (-67.032749156, 3.734523609), (-67.386302547, 3.588077))
            Line((-67.386302547, 3.588077), (-76.136302547, 3.588077))
            ThreePointArc((-76.136302547, 3.588077), (-76.489855937, 3.734523609), (-76.636302547, 4.088077))
            Line((-76.636302547, 4.088077), (-76.636302547, 6.088077))
            ThreePointArc((-76.636302547, 6.088077), (-76.489855937, 6.441630391), (-76.136302547, 6.588077))
        make_face()
        with BuildLine():
            Line((-79.011302547, 4.063077), (-80.261302547, 4.063077))
            ThreePointArc((-80.261302547, 4.063077), (-81.286302547, 5.088077), (-80.261302547, 6.113077))
            Line((-80.261302547, 6.113077), (-79.011302547, 6.113077))
            ThreePointArc((-79.011302547, 6.113077), (-77.986302547, 5.088077), (-79.011302547, 4.063077))
        make_face()
        with BuildLine():
            Line((-64.511302547, 4.063077), (-63.261302547, 4.063077))
            ThreePointArc((-63.261302547, 4.063077), (-62.236302547, 5.088077), (-63.261302547, 6.113077))
            Line((-63.261302547, 6.113077), (-64.511302547, 6.113077))
            ThreePointArc((-64.511302547, 6.113077), (-65.536302547, 5.088077), (-64.511302547, 4.063077))
        make_face()
    extrude(amount=USB_C_DEPTH, mode=Mode.SUBTRACT)


solid = part.part
